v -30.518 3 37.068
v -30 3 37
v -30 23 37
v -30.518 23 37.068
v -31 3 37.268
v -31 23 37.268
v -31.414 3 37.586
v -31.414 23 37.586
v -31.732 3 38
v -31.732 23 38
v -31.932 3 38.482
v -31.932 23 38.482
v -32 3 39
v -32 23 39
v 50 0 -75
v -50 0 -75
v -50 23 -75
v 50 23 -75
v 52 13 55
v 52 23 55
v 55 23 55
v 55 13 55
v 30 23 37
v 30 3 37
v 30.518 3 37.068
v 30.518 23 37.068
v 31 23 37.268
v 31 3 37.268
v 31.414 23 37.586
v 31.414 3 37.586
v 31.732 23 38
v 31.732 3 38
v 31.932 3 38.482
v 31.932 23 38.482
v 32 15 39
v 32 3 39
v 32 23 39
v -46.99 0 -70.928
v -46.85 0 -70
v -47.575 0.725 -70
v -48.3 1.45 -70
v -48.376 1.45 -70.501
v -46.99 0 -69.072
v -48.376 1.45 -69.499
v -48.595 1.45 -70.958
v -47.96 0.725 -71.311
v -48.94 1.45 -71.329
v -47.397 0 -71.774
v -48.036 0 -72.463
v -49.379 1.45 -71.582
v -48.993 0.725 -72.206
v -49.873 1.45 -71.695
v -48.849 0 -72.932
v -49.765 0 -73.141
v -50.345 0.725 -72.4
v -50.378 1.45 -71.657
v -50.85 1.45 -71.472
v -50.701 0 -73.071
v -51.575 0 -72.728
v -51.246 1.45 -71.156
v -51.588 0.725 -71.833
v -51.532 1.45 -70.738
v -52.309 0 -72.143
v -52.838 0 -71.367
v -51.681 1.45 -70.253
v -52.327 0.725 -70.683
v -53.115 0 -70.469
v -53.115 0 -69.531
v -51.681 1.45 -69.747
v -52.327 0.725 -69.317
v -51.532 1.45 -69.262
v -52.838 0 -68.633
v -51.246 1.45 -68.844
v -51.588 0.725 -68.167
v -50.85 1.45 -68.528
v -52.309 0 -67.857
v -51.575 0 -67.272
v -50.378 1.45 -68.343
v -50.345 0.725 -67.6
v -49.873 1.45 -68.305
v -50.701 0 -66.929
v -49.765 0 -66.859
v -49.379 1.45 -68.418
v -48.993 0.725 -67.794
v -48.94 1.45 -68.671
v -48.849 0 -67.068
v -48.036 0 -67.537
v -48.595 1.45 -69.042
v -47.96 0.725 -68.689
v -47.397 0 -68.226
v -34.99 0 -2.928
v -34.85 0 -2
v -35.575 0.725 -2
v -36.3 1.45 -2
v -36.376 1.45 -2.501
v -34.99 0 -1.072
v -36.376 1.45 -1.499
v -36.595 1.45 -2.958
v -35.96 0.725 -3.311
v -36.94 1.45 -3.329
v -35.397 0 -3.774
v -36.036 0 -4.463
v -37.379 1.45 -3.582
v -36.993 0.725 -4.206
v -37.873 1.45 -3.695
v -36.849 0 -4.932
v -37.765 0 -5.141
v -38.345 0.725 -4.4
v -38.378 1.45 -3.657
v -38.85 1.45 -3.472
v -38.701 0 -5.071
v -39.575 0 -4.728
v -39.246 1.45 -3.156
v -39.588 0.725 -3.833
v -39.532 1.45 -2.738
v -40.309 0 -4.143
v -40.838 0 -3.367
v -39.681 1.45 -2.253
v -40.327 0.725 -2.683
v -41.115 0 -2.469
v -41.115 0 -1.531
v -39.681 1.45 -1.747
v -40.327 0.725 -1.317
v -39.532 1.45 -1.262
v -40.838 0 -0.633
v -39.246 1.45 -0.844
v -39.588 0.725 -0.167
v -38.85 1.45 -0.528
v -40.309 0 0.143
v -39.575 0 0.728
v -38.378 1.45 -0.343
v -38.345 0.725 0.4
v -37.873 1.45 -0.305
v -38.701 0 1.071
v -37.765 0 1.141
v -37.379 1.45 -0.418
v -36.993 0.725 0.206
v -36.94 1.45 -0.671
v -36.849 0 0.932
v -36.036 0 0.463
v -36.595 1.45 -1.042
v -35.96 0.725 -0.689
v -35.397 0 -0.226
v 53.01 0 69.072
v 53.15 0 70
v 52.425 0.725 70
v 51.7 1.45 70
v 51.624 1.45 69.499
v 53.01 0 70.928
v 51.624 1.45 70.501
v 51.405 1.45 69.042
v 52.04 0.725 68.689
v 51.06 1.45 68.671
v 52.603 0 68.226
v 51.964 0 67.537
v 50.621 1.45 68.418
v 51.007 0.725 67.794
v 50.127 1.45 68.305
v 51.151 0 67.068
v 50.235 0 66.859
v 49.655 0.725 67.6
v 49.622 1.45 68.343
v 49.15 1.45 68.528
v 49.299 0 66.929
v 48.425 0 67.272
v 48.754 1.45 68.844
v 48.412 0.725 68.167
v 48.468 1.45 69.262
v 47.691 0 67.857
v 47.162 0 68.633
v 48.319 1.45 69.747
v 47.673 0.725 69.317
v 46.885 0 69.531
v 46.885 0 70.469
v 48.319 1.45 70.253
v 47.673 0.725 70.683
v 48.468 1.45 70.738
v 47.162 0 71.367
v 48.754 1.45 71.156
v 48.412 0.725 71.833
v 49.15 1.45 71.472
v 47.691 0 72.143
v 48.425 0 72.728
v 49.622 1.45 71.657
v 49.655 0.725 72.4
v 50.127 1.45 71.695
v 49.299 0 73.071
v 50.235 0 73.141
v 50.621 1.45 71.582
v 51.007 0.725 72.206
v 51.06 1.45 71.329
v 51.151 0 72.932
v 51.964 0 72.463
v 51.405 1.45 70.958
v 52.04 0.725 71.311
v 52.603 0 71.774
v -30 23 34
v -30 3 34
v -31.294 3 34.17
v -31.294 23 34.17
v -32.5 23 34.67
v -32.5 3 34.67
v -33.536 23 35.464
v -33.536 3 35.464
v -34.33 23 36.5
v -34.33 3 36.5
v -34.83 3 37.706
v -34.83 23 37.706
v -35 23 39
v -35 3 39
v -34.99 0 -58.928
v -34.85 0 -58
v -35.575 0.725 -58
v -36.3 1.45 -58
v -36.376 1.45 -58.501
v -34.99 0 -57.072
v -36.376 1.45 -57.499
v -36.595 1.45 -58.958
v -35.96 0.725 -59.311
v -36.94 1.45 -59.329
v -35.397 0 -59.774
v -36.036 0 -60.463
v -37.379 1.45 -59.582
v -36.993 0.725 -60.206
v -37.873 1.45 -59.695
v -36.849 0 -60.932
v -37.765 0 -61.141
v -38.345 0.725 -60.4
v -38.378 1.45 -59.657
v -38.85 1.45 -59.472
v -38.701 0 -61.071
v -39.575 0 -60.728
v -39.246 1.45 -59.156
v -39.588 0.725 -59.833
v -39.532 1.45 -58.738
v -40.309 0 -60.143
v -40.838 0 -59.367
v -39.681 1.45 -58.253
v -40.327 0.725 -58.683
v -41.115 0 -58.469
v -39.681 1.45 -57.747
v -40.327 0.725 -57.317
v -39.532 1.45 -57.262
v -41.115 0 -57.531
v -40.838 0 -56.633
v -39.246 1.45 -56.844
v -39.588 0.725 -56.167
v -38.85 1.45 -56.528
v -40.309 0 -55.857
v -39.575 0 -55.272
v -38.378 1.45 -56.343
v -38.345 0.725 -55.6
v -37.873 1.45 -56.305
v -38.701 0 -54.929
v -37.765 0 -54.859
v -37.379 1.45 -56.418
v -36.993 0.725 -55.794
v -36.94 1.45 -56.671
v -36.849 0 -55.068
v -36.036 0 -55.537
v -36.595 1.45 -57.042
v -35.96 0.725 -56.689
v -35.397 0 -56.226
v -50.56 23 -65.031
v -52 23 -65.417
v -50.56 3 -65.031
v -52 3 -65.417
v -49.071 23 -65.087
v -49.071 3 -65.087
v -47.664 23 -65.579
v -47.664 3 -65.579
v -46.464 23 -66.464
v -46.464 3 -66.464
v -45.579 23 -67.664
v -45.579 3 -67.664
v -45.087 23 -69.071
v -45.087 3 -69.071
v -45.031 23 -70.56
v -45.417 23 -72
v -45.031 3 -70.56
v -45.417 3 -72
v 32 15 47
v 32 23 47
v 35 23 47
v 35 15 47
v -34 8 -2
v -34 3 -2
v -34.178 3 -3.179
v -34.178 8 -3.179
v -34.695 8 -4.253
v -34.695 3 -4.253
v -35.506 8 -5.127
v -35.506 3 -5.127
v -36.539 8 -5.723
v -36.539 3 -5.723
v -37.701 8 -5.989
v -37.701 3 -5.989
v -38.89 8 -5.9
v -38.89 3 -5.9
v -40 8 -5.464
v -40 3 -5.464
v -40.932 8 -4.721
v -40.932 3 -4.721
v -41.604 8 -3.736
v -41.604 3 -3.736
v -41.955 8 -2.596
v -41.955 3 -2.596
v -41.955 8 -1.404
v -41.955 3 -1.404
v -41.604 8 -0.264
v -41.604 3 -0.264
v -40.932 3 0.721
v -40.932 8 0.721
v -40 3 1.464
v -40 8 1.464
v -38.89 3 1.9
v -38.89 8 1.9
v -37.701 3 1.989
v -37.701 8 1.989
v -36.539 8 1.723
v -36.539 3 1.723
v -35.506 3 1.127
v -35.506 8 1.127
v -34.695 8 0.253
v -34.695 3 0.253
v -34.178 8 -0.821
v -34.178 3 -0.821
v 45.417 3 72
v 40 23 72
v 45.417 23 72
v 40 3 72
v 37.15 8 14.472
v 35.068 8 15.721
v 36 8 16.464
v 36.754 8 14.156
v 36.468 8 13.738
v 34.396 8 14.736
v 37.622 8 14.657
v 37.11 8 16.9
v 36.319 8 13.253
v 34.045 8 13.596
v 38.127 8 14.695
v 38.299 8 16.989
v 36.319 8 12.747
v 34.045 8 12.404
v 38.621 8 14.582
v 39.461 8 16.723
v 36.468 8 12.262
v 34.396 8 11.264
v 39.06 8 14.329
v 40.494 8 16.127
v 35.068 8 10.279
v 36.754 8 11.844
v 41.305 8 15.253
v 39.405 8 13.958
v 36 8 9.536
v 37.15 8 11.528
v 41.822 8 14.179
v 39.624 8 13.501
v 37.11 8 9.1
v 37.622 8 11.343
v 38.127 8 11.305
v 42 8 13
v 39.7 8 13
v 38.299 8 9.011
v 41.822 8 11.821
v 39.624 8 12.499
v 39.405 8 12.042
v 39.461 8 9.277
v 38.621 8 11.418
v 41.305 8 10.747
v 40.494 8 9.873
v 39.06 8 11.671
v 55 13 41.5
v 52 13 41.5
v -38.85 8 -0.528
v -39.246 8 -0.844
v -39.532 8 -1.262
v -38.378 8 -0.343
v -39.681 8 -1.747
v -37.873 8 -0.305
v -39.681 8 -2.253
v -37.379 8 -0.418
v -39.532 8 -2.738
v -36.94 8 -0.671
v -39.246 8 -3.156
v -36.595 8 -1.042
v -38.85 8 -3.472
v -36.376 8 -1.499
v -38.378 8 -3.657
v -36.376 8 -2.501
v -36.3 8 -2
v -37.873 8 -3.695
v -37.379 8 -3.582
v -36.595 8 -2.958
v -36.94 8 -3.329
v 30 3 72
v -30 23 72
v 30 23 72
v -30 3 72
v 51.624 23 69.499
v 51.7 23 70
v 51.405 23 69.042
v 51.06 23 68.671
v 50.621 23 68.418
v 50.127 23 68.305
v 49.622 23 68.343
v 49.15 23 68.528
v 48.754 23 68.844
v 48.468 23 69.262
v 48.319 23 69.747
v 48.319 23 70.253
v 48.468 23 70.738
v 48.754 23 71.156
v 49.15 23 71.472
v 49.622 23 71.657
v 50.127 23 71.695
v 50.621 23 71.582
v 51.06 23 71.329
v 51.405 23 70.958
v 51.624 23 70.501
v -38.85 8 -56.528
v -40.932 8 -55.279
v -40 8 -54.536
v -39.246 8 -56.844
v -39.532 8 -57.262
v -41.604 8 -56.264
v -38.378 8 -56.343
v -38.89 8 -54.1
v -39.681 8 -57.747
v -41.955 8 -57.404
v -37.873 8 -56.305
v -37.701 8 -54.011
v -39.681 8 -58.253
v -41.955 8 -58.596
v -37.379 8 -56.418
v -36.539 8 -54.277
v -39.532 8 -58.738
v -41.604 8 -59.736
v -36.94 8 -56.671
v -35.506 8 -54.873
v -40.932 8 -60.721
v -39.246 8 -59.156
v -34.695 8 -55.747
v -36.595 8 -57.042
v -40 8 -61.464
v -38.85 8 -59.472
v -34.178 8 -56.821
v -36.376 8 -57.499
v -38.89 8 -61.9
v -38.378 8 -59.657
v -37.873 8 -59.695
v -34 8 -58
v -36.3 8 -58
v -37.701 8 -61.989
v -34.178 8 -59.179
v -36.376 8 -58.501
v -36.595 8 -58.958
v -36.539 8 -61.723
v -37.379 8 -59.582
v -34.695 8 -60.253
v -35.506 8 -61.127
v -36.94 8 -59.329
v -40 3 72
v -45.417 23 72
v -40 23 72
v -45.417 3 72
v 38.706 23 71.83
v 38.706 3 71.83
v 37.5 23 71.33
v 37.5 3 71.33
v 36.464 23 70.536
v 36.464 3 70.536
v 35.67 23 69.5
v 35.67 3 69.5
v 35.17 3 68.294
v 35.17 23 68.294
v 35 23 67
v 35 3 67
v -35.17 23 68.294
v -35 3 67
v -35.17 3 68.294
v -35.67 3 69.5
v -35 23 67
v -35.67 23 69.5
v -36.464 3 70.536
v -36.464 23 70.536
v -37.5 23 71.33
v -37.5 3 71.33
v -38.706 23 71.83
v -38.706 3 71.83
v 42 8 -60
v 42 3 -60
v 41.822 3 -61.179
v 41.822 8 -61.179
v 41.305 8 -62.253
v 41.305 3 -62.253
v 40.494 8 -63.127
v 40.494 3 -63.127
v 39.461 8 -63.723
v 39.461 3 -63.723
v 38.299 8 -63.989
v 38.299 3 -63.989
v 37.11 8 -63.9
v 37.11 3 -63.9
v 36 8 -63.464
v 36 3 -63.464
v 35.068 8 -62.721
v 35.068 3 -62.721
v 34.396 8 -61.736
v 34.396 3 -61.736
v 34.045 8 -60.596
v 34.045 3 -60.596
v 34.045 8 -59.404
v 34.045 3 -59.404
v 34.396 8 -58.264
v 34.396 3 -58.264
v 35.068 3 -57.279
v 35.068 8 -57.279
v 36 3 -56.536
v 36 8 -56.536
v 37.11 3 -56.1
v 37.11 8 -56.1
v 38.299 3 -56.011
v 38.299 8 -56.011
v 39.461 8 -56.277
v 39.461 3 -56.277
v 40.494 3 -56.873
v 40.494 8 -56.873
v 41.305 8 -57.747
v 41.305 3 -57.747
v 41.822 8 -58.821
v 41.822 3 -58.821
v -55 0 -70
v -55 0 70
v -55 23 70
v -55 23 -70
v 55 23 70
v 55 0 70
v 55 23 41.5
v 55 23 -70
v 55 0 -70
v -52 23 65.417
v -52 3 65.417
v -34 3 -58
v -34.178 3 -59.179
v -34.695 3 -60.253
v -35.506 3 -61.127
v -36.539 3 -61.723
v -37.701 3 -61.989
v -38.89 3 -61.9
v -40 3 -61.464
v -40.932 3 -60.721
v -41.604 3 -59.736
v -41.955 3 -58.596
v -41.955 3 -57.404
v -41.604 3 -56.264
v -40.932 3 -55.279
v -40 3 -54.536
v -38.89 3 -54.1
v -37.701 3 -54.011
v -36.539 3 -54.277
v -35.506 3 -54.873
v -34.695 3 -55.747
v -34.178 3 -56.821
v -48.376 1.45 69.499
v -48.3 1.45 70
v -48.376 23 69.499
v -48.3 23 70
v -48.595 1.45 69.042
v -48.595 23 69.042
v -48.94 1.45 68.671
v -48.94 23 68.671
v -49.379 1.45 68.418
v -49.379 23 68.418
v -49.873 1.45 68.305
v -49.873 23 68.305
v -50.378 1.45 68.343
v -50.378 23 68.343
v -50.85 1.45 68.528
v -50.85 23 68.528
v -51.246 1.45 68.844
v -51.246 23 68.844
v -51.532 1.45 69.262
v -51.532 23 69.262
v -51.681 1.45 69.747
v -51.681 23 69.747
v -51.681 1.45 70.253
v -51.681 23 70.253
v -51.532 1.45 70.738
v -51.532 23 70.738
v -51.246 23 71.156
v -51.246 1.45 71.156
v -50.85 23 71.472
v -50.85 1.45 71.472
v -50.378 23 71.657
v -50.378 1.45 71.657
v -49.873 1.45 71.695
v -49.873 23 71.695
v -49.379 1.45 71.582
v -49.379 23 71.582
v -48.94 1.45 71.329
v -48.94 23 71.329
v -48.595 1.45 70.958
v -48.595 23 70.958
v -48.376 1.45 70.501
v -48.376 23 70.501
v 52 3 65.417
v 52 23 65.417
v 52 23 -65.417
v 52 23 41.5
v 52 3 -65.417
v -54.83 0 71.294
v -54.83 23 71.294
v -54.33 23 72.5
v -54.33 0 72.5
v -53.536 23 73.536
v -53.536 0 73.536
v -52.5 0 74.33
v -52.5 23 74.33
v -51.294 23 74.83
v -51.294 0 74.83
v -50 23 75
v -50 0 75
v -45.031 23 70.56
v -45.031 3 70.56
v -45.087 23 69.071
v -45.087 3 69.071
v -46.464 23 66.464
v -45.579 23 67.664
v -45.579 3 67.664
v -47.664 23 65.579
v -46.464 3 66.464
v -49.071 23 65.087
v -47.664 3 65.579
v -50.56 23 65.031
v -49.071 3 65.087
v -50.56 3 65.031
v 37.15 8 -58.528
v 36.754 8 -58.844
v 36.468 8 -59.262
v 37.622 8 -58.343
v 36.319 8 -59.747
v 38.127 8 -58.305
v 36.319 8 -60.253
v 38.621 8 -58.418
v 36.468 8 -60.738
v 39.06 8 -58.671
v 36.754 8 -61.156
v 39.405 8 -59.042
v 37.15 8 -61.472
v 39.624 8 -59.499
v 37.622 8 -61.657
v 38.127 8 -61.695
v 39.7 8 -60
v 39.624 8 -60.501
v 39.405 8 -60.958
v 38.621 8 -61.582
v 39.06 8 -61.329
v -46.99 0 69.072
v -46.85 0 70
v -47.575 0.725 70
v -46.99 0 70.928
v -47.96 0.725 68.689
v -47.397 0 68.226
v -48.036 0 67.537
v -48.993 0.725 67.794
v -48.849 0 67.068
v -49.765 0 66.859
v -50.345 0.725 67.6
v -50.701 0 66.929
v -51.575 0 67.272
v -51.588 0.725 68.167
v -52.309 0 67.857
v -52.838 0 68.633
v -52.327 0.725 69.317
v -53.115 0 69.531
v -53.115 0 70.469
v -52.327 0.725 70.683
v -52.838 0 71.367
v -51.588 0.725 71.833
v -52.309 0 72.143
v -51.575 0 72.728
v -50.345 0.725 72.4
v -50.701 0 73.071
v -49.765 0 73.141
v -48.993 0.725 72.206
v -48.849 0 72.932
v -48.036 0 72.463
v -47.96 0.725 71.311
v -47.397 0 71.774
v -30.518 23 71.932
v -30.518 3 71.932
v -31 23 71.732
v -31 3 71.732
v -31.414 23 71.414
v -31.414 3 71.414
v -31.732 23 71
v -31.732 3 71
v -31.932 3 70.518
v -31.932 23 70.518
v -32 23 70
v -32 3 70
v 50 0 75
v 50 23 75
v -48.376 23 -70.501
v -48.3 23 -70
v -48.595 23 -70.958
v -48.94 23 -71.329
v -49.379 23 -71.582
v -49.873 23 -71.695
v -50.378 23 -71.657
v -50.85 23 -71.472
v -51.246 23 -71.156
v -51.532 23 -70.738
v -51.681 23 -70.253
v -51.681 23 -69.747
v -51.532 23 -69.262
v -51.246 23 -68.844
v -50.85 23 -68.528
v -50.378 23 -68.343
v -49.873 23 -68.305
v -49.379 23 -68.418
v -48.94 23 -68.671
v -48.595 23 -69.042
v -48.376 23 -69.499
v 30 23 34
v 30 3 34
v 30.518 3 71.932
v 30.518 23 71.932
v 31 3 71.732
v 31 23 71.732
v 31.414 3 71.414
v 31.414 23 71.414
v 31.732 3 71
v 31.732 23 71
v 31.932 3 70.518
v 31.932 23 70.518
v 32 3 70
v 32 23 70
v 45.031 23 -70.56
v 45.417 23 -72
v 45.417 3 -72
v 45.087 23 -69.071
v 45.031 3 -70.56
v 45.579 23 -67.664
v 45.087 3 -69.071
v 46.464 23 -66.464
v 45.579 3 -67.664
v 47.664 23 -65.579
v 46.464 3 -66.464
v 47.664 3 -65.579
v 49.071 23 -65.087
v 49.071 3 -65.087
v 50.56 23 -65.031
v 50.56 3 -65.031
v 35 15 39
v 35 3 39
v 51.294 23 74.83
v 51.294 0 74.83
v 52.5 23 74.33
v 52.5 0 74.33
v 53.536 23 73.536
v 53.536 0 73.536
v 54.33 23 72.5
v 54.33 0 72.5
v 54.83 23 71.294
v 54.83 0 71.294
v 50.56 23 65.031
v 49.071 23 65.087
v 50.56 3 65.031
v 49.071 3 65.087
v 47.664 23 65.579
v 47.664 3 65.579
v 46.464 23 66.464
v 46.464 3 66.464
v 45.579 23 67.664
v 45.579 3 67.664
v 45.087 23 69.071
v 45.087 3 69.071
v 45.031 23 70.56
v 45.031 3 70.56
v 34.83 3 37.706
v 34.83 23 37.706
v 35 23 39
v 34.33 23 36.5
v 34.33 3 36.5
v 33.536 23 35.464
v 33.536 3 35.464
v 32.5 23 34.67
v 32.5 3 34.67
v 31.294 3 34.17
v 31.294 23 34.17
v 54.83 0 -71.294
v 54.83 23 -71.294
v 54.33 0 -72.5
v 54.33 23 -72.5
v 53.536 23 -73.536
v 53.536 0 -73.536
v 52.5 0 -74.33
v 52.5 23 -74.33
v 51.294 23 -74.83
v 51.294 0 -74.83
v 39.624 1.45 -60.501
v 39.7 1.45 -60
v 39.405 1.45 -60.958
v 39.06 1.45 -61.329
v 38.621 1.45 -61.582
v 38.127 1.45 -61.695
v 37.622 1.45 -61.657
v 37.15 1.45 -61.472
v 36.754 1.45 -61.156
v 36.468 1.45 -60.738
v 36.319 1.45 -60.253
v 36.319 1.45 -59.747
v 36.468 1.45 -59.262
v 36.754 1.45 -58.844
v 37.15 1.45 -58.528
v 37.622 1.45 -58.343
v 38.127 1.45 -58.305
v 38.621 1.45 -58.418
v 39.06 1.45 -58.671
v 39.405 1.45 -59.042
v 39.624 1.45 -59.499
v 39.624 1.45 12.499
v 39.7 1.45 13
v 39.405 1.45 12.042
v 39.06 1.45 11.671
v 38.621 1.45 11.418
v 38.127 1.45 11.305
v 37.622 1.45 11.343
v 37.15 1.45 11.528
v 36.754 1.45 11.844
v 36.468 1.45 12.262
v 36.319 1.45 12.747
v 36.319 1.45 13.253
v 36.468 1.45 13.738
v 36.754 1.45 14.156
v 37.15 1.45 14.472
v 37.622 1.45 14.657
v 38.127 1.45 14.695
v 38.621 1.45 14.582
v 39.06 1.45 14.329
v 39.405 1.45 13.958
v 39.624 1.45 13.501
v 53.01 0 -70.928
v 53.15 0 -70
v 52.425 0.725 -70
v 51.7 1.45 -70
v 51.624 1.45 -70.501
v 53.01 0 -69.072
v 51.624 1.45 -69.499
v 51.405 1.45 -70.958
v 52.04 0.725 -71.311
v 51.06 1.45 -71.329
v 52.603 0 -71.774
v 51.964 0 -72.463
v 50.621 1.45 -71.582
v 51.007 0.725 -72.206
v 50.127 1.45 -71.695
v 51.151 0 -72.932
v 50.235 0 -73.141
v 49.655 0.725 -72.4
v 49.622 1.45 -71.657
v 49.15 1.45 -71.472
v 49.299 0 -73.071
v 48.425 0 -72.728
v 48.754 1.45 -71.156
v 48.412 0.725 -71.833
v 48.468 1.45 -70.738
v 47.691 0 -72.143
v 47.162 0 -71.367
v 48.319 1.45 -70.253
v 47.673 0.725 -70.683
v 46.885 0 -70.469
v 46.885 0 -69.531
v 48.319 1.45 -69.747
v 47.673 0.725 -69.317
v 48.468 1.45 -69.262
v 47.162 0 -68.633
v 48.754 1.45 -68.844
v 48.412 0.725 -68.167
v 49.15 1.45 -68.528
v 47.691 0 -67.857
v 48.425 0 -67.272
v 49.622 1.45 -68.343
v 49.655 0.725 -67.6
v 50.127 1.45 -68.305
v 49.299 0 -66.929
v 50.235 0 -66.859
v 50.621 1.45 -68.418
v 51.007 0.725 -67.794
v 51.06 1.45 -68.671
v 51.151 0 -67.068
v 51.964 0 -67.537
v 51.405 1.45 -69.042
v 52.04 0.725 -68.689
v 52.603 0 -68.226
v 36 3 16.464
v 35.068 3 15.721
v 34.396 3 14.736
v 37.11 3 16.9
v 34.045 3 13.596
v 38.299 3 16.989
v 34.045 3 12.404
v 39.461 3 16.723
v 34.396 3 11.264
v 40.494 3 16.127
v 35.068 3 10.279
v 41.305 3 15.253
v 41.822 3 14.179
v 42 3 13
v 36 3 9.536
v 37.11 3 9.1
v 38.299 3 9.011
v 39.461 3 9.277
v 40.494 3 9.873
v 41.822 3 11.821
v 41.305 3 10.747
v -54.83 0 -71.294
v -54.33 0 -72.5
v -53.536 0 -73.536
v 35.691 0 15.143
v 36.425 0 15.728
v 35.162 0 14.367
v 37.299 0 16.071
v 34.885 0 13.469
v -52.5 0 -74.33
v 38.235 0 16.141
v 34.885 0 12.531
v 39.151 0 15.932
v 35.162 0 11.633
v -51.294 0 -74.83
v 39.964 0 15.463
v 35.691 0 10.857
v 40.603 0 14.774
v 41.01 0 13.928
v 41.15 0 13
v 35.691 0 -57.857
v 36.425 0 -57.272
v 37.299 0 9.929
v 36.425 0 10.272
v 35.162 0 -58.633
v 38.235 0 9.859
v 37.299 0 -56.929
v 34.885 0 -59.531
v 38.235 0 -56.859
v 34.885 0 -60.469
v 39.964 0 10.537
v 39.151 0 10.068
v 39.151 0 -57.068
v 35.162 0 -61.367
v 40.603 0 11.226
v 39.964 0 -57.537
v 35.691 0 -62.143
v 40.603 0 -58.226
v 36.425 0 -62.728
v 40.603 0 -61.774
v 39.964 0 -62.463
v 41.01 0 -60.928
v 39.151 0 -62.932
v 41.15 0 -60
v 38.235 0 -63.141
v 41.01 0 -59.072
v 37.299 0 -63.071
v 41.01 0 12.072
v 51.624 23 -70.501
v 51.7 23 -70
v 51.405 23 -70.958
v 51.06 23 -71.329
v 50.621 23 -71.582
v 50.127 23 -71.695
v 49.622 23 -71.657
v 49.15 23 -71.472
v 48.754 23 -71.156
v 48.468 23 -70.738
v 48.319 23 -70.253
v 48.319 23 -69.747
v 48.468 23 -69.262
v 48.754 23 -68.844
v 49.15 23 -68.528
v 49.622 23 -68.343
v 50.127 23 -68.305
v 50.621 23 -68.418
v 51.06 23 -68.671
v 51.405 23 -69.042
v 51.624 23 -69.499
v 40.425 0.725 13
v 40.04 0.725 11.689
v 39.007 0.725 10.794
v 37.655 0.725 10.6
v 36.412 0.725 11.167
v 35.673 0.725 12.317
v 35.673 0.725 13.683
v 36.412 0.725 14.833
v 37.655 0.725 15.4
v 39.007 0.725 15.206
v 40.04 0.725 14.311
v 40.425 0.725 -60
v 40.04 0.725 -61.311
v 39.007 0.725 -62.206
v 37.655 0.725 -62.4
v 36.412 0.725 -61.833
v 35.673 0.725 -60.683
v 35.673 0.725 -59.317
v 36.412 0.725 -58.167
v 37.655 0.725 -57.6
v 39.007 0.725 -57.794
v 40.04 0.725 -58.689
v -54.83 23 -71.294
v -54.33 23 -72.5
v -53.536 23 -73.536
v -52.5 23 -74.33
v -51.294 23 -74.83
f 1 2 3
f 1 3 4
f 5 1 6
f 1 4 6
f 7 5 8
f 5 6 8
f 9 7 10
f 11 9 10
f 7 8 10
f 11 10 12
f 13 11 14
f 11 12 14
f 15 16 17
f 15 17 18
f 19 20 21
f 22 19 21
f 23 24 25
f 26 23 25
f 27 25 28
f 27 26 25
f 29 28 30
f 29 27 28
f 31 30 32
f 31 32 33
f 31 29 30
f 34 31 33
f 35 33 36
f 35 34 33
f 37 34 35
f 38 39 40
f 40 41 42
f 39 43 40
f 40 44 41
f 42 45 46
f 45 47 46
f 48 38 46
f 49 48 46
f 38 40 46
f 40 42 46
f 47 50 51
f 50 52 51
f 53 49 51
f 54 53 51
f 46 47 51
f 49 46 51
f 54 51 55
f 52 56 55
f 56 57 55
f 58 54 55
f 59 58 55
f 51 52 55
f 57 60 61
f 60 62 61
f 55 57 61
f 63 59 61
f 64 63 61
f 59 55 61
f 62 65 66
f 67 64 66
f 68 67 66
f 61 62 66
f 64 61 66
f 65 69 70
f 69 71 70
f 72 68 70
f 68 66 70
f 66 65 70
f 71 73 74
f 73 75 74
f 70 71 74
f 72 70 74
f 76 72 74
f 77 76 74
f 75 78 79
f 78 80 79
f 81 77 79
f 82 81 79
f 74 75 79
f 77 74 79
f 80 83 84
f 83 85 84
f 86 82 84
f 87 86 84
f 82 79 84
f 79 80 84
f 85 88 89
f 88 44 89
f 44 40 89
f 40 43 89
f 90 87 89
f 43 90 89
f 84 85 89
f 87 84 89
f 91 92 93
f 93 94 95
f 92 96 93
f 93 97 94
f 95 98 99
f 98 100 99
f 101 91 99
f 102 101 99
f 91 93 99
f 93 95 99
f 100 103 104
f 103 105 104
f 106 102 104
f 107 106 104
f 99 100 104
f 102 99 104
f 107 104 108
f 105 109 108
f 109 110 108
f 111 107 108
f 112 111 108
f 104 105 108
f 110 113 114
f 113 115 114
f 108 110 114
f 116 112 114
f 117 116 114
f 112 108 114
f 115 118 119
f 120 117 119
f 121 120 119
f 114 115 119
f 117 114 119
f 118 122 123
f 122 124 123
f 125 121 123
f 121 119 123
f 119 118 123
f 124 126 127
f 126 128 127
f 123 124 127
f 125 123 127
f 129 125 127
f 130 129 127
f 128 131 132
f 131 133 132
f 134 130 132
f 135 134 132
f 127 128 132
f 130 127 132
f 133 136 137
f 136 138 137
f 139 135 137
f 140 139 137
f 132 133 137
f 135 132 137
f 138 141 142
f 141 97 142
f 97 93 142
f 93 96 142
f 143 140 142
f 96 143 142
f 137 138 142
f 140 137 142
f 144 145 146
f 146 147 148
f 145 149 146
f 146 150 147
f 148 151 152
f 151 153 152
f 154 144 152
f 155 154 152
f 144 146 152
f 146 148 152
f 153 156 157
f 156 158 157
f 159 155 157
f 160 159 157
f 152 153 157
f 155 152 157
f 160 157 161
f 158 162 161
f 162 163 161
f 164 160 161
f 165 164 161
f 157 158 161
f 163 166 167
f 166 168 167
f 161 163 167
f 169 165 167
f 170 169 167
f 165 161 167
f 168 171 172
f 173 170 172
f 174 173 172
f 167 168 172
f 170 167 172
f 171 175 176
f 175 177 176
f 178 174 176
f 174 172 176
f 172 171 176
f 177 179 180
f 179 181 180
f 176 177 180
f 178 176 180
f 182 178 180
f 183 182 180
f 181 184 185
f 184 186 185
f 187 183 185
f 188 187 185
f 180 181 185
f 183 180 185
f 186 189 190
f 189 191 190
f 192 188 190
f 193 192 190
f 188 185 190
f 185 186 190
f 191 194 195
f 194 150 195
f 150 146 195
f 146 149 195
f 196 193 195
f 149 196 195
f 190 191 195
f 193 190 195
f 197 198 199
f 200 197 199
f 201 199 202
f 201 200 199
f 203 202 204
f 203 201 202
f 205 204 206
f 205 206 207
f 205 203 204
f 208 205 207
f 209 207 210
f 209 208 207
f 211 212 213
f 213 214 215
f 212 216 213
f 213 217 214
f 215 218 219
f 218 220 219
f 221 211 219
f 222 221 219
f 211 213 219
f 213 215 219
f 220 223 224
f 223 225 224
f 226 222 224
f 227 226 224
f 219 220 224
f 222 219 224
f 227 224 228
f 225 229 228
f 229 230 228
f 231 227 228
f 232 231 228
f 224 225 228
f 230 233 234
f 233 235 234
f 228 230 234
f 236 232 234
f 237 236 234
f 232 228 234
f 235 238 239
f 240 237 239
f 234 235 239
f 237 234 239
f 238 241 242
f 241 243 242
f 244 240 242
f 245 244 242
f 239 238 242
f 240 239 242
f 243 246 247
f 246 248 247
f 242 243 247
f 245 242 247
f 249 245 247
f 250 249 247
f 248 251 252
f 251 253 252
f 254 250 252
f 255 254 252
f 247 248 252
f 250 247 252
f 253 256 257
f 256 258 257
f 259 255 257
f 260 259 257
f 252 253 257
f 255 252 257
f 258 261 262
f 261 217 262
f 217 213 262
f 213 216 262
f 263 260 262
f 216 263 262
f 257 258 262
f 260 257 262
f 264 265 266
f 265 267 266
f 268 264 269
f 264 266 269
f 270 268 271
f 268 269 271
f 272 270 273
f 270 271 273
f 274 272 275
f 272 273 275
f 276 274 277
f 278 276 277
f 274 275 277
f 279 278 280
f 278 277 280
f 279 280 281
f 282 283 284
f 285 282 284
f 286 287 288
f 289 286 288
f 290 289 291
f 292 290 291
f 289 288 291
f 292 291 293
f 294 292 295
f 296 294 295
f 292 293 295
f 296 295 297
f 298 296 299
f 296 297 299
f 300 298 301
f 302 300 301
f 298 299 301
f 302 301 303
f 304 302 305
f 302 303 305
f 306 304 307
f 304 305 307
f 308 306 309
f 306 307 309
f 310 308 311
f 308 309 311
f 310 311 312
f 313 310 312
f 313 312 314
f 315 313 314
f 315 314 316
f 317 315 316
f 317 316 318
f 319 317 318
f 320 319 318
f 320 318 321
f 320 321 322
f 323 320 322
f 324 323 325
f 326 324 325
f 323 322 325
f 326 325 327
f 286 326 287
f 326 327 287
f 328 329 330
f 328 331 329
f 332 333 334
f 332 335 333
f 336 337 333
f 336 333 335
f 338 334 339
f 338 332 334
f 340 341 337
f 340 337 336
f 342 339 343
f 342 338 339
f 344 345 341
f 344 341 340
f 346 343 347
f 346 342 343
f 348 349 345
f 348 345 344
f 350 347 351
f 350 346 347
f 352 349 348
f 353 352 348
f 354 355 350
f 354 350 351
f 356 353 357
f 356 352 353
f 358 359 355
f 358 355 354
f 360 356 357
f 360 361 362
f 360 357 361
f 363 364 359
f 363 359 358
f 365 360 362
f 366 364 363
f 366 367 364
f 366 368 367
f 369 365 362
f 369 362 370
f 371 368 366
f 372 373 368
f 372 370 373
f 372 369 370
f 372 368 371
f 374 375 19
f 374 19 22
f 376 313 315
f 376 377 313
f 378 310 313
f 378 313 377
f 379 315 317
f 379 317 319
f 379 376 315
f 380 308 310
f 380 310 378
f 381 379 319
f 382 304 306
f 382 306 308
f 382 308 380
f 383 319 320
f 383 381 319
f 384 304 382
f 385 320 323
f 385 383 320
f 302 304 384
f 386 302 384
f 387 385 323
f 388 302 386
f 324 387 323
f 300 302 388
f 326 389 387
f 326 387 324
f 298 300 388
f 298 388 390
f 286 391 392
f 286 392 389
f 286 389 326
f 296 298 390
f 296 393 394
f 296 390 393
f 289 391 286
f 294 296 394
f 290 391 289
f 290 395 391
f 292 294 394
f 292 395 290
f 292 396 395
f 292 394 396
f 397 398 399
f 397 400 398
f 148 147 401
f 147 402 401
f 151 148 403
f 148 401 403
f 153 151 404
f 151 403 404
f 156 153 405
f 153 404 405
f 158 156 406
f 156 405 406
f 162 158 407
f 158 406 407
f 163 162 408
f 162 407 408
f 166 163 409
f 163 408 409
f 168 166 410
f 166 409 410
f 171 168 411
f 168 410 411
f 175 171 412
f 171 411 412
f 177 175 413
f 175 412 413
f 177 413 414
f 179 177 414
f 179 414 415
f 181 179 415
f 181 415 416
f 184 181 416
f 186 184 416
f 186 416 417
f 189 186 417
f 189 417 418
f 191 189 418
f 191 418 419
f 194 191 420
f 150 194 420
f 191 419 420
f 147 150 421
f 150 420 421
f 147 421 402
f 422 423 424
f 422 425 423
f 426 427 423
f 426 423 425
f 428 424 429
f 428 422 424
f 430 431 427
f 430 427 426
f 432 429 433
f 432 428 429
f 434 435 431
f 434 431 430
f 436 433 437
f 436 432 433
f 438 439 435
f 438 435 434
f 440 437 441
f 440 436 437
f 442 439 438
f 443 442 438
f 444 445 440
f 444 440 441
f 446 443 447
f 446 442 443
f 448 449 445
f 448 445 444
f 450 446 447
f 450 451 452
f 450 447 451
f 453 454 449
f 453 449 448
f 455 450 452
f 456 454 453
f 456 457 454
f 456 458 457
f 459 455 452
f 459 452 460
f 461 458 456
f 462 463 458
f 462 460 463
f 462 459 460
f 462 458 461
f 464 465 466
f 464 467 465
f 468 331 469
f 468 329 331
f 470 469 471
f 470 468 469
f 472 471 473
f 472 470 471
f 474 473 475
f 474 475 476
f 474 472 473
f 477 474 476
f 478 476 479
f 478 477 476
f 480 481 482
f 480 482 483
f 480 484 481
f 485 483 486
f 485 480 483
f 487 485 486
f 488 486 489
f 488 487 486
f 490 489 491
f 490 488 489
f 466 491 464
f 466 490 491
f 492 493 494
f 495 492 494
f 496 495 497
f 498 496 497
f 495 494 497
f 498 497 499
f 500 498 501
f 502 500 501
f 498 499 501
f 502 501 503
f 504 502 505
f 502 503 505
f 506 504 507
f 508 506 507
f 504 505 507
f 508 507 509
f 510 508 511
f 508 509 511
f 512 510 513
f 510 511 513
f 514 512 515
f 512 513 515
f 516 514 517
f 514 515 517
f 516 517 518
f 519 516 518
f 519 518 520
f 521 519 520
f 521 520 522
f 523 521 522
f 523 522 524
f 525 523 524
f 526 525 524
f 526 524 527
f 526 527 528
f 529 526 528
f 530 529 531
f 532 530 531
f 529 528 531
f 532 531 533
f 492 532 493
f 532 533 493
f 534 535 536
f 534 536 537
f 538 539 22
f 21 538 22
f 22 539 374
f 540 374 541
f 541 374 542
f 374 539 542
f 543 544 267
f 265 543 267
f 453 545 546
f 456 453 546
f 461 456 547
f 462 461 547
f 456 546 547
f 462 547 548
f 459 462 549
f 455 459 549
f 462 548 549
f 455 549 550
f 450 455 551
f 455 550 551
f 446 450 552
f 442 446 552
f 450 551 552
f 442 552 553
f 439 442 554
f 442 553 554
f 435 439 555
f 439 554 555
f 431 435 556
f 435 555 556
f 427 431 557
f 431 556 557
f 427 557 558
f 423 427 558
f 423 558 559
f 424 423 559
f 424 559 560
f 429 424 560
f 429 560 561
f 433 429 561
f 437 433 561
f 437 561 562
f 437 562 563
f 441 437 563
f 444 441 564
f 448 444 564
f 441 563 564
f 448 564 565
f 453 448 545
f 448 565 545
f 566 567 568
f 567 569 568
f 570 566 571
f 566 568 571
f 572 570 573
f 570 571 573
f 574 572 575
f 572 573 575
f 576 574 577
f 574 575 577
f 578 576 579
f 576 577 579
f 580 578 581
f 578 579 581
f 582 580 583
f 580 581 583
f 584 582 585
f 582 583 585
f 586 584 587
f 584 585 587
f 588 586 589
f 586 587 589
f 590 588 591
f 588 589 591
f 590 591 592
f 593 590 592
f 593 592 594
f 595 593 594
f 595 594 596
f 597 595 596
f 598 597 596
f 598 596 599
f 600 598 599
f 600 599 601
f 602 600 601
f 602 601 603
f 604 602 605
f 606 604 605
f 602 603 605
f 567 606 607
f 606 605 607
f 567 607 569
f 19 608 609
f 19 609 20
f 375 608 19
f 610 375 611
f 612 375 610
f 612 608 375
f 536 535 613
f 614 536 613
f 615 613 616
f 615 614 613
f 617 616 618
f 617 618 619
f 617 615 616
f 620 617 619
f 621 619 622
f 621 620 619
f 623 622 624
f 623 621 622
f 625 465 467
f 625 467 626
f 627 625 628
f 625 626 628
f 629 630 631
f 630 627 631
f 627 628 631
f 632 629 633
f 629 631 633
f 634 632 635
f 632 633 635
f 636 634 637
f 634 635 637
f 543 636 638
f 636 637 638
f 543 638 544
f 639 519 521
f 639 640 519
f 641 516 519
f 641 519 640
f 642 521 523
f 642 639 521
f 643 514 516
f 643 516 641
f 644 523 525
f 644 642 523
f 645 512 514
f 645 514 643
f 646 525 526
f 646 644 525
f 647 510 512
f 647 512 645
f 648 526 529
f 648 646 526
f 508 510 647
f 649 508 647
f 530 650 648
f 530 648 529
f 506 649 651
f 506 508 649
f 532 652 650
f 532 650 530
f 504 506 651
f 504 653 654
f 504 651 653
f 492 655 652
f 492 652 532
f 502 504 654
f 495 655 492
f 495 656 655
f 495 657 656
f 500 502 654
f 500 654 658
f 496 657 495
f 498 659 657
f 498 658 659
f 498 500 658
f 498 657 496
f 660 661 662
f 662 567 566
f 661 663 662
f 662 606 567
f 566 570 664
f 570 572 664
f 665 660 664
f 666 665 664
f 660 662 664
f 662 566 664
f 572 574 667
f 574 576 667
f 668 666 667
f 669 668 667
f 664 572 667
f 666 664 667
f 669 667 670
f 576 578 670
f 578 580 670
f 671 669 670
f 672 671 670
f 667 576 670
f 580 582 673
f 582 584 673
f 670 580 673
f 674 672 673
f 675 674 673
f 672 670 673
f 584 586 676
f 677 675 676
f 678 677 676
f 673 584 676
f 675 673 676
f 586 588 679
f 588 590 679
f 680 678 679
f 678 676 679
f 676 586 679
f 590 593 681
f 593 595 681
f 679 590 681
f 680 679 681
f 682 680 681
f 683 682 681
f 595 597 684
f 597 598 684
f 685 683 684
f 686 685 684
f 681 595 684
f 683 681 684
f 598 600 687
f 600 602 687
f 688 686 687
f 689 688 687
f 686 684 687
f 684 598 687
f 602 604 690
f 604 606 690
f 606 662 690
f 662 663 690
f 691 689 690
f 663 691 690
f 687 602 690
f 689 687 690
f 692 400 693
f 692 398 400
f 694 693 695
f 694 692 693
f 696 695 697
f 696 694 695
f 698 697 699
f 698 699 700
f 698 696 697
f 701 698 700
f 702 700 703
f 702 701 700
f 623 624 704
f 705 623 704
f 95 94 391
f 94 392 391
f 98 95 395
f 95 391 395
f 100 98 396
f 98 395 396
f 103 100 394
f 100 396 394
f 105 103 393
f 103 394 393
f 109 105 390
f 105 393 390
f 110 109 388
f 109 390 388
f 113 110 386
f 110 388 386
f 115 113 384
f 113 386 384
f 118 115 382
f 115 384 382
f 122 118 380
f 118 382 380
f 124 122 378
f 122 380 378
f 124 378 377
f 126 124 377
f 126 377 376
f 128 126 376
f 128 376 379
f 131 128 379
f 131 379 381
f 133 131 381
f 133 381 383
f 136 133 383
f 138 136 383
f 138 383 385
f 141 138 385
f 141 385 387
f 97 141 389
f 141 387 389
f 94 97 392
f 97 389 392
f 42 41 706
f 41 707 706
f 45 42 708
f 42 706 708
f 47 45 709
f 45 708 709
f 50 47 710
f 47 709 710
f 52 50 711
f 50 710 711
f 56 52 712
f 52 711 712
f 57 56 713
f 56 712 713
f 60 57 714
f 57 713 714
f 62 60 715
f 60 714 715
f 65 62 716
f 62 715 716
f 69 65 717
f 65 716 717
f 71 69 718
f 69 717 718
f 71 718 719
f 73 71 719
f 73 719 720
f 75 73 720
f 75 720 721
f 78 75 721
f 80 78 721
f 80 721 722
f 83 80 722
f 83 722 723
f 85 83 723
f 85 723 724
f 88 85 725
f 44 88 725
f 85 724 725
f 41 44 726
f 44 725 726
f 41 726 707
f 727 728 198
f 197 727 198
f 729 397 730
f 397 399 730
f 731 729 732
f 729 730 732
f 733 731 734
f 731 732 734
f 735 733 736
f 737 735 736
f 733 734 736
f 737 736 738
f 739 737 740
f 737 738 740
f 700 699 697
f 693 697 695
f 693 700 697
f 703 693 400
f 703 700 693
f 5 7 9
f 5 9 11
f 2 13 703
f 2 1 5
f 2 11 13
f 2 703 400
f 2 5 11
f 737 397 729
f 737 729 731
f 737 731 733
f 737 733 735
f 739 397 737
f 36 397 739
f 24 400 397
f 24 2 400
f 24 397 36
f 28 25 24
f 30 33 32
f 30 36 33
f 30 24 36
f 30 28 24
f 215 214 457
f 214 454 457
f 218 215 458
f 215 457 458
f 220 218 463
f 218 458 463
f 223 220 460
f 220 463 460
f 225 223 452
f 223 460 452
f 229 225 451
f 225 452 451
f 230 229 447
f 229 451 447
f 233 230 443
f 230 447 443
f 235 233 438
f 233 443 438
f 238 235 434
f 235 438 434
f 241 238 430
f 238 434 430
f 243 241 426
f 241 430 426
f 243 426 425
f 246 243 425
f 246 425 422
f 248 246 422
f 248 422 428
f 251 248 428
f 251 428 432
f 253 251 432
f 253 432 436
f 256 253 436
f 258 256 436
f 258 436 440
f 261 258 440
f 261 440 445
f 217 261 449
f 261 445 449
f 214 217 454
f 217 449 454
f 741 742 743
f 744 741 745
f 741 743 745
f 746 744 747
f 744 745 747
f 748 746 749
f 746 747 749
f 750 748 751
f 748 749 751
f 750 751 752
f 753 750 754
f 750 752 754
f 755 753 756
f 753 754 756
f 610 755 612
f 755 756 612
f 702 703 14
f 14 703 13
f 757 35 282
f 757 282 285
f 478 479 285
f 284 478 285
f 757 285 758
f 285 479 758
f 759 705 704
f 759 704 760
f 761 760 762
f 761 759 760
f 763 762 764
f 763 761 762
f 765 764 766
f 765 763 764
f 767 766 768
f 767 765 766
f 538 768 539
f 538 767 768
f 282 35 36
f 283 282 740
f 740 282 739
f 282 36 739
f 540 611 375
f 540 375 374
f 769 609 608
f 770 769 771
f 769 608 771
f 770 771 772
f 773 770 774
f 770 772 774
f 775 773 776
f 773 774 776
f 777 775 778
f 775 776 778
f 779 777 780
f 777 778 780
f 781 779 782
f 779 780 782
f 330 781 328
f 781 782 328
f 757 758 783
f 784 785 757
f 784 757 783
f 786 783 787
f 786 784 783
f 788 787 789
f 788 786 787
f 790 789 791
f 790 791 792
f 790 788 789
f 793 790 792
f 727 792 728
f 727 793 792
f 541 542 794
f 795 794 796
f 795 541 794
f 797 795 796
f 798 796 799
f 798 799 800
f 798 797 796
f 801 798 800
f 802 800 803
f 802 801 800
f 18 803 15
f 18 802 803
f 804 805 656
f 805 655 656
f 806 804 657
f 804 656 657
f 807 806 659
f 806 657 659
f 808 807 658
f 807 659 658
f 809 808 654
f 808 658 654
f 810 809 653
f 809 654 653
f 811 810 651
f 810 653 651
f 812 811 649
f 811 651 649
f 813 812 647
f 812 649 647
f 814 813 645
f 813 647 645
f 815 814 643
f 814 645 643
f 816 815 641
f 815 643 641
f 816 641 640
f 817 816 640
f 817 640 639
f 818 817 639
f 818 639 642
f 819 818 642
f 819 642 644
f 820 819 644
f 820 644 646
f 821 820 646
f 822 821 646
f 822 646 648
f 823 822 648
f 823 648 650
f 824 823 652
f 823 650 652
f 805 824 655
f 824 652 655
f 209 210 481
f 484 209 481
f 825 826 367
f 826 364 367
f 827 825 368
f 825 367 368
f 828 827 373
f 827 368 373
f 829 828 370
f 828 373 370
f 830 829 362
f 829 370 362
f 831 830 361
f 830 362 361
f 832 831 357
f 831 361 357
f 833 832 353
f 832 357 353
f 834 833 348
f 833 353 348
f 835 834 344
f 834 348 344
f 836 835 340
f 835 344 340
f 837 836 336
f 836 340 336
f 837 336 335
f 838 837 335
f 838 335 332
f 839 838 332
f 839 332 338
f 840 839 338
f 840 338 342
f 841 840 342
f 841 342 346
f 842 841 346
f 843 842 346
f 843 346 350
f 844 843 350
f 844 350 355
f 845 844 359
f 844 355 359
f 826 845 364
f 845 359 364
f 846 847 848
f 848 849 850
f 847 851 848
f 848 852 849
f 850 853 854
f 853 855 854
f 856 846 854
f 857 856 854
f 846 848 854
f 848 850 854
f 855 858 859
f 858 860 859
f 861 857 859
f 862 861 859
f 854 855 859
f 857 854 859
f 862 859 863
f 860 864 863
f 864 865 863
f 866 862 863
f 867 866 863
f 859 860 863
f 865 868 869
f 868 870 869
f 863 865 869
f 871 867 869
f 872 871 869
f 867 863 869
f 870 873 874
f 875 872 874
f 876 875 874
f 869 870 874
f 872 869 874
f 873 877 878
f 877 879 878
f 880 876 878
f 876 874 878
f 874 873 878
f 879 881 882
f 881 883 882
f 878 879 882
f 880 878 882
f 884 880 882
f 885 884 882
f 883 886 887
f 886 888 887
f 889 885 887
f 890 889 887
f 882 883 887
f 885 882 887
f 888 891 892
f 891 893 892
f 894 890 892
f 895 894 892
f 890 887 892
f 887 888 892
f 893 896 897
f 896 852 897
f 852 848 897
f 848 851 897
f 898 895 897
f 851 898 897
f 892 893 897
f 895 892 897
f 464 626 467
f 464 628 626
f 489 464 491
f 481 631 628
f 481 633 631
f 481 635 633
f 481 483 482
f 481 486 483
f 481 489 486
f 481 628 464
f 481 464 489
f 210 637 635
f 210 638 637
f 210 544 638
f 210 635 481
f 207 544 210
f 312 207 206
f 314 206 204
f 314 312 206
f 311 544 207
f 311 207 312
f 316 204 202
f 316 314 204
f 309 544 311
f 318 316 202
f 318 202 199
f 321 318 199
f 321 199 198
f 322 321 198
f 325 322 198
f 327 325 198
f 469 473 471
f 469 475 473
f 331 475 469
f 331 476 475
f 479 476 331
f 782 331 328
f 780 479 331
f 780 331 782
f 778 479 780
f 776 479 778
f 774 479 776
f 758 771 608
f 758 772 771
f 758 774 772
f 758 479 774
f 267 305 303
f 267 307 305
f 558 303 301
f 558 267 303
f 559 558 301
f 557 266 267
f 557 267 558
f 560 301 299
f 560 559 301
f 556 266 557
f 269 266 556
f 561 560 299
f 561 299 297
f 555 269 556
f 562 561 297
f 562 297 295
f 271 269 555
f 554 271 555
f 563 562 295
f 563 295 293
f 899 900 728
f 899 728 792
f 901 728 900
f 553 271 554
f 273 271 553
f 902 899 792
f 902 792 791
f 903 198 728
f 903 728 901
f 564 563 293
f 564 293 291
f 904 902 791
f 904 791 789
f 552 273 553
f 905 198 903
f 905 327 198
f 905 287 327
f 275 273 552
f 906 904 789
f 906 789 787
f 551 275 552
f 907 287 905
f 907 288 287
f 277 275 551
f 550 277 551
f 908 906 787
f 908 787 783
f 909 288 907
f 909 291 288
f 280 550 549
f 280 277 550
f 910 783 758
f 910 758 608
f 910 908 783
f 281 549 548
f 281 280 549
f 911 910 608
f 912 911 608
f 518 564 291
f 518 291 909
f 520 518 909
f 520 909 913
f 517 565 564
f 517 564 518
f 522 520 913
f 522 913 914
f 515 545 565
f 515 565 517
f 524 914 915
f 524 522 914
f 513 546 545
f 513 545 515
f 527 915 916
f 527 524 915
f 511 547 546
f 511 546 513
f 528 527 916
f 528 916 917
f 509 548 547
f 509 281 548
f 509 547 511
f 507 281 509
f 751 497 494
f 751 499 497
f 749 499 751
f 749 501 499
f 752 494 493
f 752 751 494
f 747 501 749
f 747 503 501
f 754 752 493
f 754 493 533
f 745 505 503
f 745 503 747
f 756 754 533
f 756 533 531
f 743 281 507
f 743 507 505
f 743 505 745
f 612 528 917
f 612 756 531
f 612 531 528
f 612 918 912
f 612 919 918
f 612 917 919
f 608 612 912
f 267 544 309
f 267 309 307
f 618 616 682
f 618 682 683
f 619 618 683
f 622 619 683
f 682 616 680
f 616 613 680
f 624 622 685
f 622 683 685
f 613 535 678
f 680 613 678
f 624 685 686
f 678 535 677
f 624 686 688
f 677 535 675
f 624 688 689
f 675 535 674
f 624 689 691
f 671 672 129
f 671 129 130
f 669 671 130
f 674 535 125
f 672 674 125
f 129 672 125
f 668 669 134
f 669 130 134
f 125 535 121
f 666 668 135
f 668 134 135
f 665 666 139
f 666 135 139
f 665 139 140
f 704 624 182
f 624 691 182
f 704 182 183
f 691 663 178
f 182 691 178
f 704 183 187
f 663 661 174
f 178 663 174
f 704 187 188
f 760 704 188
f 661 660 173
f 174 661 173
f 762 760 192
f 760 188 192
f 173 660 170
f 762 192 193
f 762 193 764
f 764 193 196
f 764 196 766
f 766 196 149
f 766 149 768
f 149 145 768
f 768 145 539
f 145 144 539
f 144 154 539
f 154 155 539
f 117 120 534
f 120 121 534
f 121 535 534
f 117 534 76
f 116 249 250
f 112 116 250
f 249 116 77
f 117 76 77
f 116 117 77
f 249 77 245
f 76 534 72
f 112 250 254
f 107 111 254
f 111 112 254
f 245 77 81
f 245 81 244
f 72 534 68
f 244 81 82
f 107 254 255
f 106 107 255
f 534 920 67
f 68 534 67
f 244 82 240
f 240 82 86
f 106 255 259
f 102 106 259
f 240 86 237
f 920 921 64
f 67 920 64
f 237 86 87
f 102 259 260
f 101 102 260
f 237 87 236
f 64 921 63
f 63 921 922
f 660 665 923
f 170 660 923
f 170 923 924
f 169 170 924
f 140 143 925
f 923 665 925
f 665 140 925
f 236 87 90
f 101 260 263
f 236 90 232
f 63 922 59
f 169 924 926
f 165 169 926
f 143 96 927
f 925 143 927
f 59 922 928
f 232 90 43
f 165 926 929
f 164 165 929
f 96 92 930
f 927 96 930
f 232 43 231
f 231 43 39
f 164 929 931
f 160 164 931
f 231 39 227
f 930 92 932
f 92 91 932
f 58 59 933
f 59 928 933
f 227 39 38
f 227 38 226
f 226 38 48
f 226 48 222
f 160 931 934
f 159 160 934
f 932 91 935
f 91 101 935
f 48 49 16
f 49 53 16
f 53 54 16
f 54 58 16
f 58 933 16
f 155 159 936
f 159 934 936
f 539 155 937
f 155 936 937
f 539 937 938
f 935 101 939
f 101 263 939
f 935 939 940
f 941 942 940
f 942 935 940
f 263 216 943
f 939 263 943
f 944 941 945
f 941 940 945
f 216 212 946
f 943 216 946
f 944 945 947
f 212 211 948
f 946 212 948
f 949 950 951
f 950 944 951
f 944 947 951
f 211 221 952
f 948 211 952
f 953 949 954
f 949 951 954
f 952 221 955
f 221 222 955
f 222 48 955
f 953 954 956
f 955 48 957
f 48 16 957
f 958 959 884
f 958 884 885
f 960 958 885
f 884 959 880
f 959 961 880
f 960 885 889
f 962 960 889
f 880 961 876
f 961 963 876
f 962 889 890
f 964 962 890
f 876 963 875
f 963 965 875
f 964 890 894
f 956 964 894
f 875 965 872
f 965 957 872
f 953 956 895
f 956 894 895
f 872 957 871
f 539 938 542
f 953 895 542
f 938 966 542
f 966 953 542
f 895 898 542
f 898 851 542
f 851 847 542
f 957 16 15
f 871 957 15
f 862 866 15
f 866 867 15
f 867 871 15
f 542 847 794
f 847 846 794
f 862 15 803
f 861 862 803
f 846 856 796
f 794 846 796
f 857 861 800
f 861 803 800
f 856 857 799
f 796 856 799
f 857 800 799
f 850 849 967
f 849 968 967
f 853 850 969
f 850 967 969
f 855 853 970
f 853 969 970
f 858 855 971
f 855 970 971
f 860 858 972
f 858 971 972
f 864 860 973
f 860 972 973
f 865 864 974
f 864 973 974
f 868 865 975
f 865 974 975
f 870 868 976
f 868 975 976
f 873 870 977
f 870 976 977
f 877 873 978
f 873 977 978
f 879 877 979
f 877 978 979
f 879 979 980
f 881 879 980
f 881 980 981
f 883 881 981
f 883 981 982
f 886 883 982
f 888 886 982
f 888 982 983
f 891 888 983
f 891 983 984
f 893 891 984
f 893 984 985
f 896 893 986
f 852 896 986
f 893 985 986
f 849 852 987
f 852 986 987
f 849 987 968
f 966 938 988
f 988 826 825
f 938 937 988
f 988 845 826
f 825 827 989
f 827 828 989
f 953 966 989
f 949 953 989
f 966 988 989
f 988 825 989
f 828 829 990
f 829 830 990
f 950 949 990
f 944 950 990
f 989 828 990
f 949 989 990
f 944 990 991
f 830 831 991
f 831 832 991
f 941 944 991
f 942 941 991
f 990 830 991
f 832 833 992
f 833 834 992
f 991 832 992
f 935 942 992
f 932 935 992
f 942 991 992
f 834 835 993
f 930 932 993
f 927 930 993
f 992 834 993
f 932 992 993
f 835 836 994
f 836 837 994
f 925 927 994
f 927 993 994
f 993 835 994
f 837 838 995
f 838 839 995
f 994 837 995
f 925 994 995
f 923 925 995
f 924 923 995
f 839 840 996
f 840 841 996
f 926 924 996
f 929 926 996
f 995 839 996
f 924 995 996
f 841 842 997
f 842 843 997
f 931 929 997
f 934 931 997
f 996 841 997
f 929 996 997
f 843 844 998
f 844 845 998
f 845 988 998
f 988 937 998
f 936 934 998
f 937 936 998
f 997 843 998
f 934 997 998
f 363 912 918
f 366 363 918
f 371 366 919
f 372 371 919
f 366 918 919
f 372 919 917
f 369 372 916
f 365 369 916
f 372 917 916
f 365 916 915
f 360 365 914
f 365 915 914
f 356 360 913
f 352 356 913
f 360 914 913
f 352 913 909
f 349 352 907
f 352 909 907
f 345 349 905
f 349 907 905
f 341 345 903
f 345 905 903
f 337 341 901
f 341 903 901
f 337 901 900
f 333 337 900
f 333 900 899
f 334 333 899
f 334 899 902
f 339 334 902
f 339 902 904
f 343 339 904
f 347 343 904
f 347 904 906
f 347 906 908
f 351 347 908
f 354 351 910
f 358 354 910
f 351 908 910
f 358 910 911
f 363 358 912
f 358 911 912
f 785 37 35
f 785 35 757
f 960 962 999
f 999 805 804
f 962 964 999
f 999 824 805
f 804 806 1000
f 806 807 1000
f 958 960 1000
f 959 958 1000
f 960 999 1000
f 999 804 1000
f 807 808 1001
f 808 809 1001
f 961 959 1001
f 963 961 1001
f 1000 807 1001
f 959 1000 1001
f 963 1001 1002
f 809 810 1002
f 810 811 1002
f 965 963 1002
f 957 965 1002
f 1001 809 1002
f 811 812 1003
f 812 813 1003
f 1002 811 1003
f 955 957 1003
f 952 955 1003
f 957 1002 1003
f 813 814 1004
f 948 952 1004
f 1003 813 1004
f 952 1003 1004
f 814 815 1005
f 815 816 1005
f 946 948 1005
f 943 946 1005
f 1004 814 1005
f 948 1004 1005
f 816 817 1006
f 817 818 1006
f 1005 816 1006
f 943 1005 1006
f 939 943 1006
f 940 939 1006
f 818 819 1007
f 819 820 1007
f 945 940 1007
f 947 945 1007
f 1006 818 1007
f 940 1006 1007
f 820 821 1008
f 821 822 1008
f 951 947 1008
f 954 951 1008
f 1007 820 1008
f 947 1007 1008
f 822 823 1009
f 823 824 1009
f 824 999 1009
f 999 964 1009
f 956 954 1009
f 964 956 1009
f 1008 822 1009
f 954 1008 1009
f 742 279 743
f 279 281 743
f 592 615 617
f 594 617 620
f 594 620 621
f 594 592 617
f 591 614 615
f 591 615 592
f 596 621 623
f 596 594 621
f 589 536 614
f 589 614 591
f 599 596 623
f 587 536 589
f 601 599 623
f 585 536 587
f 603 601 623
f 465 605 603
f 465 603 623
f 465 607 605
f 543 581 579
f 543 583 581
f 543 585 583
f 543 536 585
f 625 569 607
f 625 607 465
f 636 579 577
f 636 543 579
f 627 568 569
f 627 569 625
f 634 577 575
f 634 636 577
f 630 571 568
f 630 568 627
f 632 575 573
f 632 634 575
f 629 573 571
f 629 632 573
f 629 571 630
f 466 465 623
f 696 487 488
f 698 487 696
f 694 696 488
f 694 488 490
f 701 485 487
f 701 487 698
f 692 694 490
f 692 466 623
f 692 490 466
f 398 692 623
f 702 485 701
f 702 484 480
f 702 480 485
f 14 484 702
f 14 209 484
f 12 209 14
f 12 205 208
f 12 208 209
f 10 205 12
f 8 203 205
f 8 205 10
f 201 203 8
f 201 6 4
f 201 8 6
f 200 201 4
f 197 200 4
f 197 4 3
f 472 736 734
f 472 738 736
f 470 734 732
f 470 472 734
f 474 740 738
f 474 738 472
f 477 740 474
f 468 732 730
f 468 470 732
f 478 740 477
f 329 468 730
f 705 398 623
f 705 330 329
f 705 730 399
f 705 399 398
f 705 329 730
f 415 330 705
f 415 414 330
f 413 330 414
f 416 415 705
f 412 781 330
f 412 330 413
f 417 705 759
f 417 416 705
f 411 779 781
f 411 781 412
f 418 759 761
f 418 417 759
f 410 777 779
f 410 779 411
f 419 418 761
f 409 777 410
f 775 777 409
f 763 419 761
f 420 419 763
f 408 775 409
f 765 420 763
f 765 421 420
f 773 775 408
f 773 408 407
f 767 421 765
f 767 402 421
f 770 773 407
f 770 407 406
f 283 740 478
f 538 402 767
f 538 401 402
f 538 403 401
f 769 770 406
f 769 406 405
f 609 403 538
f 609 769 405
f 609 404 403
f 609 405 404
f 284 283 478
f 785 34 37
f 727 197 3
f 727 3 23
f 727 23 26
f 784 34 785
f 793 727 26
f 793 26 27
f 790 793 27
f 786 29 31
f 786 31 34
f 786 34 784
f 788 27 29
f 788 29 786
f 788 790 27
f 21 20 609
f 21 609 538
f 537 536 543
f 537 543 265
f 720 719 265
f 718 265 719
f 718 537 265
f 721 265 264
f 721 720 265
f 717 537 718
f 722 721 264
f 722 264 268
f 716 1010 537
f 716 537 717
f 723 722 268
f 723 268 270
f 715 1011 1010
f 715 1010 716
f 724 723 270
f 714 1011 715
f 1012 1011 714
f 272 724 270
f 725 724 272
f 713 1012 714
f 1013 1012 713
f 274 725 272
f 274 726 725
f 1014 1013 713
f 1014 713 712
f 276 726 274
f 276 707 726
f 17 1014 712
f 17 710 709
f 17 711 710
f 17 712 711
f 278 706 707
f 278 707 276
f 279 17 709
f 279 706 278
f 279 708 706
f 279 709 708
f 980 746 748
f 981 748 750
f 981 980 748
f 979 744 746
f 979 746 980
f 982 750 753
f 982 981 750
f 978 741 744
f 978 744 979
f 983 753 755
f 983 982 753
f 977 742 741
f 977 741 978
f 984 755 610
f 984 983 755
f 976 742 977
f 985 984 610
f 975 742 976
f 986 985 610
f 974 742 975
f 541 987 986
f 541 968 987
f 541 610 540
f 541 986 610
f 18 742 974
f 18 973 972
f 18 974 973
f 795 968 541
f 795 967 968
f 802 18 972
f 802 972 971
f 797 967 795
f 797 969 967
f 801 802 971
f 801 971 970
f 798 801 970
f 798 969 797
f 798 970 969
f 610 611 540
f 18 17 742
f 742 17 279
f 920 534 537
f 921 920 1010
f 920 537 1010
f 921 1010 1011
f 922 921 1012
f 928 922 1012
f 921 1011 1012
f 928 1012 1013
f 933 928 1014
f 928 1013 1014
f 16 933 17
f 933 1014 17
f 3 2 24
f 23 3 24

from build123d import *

# Parameters (mm, degrees)
ESBO_O1_W                                            = 110
ESBO_O1_H                                            = 150
RESSALTO_EXTRUS_O3_DEPTH                             = 23
FILETE2_R                                            = 5
CASCA1_T                                             = -3
ESBO_O14_R                                           = 5
RESSALTO_EXTRUS_O7_DEPTH                             = 20
RESSALTO_EXTRUS_O4_DEPTH                             = 23
FILETE6_R                                            = 2
FILETE8_R                                            = 5
ESBO_O7_W                                            = 3
ESBO_O7_H                                            = 8
CORTE_EXTRUS_O1_DEPTH                                = 8
ESBO_O8_W                                            = 3
ESBO_O8_H                                            = 13.5
CORTE_EXTRUS_O2_DEPTH                                = 10
ESBO_O17_R                                           = 4
RESSALTO_EXTRUS_O8_DEPTH                             = 5
ESCAREADO_PARA_PARAFUSO_DE_M_QUINA_COM_C_D           = 3.4
ESCAREADO_PARA_PARAFUSO_DE_M_QUINA_COM_C_DEPTH       = 15
ESCAREADO_PARA_PARAFUSO_DE_M_QUINA_COM_C_CSINK_D     = 6.3
ESCAREADO_PARA_PARAFUSO_DE_M_QUINA_COM_C_CSINK_ANGLE = 90
ESCAREADO_PARA_PARAFUSO_DE_M_QUINA_COM_C_TIP         = 1.021463052
ESCAREADO_PARA_PARAFUSO_DE_M_QUINA_C_2_D             = 3.4
ESCAREADO_PARA_PARAFUSO_DE_M_QUINA_C_2_CSINK_D       = 6.3
ESCAREADO_PARA_PARAFUSO_DE_M_QUINA_C_2_CSINK_ANGLE   = 90


with BuildPart() as part:
    # Esboço1 → Ressalto-extrusão3 (new body)
    with BuildSketch(Plane(origin=(0, 0, 0), x_dir=(1, 0, 0), z_dir=(0, 1, 0))):
        Rectangle(ESBO_O1_W, ESBO_O1_H)
    extrude(amount=RESSALTO_EXTRUS_O3_DEPTH)

    # Filete2
    filete2_edges = [part.edges().sort_by_distance(p)[0] for p in [
        (55, 11.5, 75),
        (-55, 11.5, 75),
        (-55, 11.5, -75),
        (55, 11.5, -75),
    ]]
    fillet(filete2_edges, radius=FILETE2_R)

    # Casca1
    casca1_openings = [part.faces().sort_by_distance(p)[0] for p in [
        (0, 23, 0),
    ]]
    offset(amount=CASCA1_T, openings=casca1_openings, kind=Kind.INTERSECTION)

    # Esboço14 → Ressalto-extrusão7 (add)
    with BuildSketch(Plane(origin=(0, 3, 0), x_dir=(1, 0, 0), z_dir=(0, 1, 0))):
        with Locations((-50, -70)):
            Circle(ESBO_O14_R)
        with Locations((50, -70)):
            Circle(ESBO_O14_R)
        with Locations((50, 70)):
            Circle(ESBO_O14_R)
        with Locations((-50, 70)):
            Circle(ESBO_O14_R)
    extrude(amount=RESSALTO_EXTRUS_O7_DEPTH)

    # Esboço6 → Ressalto-extrusão4 (add)
    with BuildSketch(Plane(origin=(0, 0, 0), x_dir=(1, 0, 0), z_dir=(0, 1, 0))):
        Polygon((-32, -37), (32, -37), (32, -72), (35, -72), (35, -34), (-35, -34), (-35, -72), (-32, -72), align=None)
    extrude(amount=RESSALTO_EXTRUS_O4_DEPTH)

    # Filete6
    filete6_edges = [part.edges().sort_by_distance(p)[0] for p in [
        (32, 13, 37),
        (-32, 13, 37),
        (-32, 13, 72),
        (32, 13, 72),
    ]]
    fillet(filete6_edges, radius=FILETE6_R)

    # Filete8
    filete8_edges = [part.edges().sort_by_distance(p)[0] for p in [
        (-35, 13, 72),
        (-35, 13, 34),
        (35, 13, 34),
        (35, 13, 72),
    ]]
    fillet(filete8_edges, radius=FILETE8_R)

    # Esboço7 → Corte-extrusão1 (cut)
    with BuildSketch(Plane(origin=(0, 23, 0), x_dir=(1, 0, 0), z_dir=(0, 1, 0))):
        with Locations((33.5, -43)):
            Rectangle(ESBO_O7_W, ESBO_O7_H)
    extrude(amount=-CORTE_EXTRUS_O1_DEPTH, mode=Mode.SUBTRACT)

    # Esboço8 → Corte-extrusão2 (cut)
    with BuildSketch(Plane(origin=(0, 23, 0), x_dir=(1, 0, 0), z_dir=(0, 1, 0))):
        with Locations((53.5, -48.25)):
            Rectangle(ESBO_O8_W, ESBO_O8_H)
    extrude(amount=-CORTE_EXTRUS_O2_DEPTH, mode=Mode.SUBTRACT)

    # Esboço17 → Ressalto-extrusão8 (add)
    with BuildSketch(Plane(origin=(0, 3, 0), x_dir=(1, 0, 0), z_dir=(0, 1, 0))):
        with Locations((-38, 58)):
            Circle(ESBO_O17_R)
        with Locations((-38, 2)):
            Circle(ESBO_O17_R)
        with Locations((38, -13)):
            Circle(ESBO_O17_R)
        with Locations((38, 60)):
            Circle(ESBO_O17_R)
    extrude(amount=RESSALTO_EXTRUS_O8_DEPTH)

    # Escareado para parafuso de m_quina com c
    with Locations(Plane(origin=(0, 0, 0), x_dir=(-1, 0, 0), z_dir=(0, -1, 0))):
        with Locations((-38, -13), (38, 2), (38, 58), (-38, 60)):
            CounterSinkHole(ESCAREADO_PARA_PARAFUSO_DE_M_QUINA_COM_C_D / 2, ESCAREADO_PARA_PARAFUSO_DE_M_QUINA_COM_C_CSINK_D / 2, depth=ESCAREADO_PARA_PARAFUSO_DE_M_QUINA_COM_C_DEPTH, counter_sink_angle=ESCAREADO_PARA_PARAFUSO_DE_M_QUINA_COM_C_CSINK_ANGLE)
            with Locations((0, 0, -(ESCAREADO_PARA_PARAFUSO_DE_M_QUINA_COM_C_DEPTH + ESCAREADO_PARA_PARAFUSO_DE_M_QUINA_COM_C_TIP / 2))):  # 118° drill point
                Cone(0, ESCAREADO_PARA_PARAFUSO_DE_M_QUINA_COM_C_D / 2, ESCAREADO_PARA_PARAFUSO_DE_M_QUINA_COM_C_TIP, mode=Mode.SUBTRACT)

    # Escareado para parafuso de m_quina c 2 (through all)
    with Locations(Plane(origin=(0, 0, 0), x_dir=(-1, 0, 0), z_dir=(0, -1, 0))):
        with Locations((50, -70), (-50, -70), (-50, 70), (50, 70)):
            CounterSinkHole(ESCAREADO_PARA_PARAFUSO_DE_M_QUINA_C_2_D / 2, ESCAREADO_PARA_PARAFUSO_DE_M_QUINA_C_2_CSINK_D / 2, counter_sink_angle=ESCAREADO_PARA_PARAFUSO_DE_M_QUINA_C_2_CSINK_ANGLE)


solid = part.part
